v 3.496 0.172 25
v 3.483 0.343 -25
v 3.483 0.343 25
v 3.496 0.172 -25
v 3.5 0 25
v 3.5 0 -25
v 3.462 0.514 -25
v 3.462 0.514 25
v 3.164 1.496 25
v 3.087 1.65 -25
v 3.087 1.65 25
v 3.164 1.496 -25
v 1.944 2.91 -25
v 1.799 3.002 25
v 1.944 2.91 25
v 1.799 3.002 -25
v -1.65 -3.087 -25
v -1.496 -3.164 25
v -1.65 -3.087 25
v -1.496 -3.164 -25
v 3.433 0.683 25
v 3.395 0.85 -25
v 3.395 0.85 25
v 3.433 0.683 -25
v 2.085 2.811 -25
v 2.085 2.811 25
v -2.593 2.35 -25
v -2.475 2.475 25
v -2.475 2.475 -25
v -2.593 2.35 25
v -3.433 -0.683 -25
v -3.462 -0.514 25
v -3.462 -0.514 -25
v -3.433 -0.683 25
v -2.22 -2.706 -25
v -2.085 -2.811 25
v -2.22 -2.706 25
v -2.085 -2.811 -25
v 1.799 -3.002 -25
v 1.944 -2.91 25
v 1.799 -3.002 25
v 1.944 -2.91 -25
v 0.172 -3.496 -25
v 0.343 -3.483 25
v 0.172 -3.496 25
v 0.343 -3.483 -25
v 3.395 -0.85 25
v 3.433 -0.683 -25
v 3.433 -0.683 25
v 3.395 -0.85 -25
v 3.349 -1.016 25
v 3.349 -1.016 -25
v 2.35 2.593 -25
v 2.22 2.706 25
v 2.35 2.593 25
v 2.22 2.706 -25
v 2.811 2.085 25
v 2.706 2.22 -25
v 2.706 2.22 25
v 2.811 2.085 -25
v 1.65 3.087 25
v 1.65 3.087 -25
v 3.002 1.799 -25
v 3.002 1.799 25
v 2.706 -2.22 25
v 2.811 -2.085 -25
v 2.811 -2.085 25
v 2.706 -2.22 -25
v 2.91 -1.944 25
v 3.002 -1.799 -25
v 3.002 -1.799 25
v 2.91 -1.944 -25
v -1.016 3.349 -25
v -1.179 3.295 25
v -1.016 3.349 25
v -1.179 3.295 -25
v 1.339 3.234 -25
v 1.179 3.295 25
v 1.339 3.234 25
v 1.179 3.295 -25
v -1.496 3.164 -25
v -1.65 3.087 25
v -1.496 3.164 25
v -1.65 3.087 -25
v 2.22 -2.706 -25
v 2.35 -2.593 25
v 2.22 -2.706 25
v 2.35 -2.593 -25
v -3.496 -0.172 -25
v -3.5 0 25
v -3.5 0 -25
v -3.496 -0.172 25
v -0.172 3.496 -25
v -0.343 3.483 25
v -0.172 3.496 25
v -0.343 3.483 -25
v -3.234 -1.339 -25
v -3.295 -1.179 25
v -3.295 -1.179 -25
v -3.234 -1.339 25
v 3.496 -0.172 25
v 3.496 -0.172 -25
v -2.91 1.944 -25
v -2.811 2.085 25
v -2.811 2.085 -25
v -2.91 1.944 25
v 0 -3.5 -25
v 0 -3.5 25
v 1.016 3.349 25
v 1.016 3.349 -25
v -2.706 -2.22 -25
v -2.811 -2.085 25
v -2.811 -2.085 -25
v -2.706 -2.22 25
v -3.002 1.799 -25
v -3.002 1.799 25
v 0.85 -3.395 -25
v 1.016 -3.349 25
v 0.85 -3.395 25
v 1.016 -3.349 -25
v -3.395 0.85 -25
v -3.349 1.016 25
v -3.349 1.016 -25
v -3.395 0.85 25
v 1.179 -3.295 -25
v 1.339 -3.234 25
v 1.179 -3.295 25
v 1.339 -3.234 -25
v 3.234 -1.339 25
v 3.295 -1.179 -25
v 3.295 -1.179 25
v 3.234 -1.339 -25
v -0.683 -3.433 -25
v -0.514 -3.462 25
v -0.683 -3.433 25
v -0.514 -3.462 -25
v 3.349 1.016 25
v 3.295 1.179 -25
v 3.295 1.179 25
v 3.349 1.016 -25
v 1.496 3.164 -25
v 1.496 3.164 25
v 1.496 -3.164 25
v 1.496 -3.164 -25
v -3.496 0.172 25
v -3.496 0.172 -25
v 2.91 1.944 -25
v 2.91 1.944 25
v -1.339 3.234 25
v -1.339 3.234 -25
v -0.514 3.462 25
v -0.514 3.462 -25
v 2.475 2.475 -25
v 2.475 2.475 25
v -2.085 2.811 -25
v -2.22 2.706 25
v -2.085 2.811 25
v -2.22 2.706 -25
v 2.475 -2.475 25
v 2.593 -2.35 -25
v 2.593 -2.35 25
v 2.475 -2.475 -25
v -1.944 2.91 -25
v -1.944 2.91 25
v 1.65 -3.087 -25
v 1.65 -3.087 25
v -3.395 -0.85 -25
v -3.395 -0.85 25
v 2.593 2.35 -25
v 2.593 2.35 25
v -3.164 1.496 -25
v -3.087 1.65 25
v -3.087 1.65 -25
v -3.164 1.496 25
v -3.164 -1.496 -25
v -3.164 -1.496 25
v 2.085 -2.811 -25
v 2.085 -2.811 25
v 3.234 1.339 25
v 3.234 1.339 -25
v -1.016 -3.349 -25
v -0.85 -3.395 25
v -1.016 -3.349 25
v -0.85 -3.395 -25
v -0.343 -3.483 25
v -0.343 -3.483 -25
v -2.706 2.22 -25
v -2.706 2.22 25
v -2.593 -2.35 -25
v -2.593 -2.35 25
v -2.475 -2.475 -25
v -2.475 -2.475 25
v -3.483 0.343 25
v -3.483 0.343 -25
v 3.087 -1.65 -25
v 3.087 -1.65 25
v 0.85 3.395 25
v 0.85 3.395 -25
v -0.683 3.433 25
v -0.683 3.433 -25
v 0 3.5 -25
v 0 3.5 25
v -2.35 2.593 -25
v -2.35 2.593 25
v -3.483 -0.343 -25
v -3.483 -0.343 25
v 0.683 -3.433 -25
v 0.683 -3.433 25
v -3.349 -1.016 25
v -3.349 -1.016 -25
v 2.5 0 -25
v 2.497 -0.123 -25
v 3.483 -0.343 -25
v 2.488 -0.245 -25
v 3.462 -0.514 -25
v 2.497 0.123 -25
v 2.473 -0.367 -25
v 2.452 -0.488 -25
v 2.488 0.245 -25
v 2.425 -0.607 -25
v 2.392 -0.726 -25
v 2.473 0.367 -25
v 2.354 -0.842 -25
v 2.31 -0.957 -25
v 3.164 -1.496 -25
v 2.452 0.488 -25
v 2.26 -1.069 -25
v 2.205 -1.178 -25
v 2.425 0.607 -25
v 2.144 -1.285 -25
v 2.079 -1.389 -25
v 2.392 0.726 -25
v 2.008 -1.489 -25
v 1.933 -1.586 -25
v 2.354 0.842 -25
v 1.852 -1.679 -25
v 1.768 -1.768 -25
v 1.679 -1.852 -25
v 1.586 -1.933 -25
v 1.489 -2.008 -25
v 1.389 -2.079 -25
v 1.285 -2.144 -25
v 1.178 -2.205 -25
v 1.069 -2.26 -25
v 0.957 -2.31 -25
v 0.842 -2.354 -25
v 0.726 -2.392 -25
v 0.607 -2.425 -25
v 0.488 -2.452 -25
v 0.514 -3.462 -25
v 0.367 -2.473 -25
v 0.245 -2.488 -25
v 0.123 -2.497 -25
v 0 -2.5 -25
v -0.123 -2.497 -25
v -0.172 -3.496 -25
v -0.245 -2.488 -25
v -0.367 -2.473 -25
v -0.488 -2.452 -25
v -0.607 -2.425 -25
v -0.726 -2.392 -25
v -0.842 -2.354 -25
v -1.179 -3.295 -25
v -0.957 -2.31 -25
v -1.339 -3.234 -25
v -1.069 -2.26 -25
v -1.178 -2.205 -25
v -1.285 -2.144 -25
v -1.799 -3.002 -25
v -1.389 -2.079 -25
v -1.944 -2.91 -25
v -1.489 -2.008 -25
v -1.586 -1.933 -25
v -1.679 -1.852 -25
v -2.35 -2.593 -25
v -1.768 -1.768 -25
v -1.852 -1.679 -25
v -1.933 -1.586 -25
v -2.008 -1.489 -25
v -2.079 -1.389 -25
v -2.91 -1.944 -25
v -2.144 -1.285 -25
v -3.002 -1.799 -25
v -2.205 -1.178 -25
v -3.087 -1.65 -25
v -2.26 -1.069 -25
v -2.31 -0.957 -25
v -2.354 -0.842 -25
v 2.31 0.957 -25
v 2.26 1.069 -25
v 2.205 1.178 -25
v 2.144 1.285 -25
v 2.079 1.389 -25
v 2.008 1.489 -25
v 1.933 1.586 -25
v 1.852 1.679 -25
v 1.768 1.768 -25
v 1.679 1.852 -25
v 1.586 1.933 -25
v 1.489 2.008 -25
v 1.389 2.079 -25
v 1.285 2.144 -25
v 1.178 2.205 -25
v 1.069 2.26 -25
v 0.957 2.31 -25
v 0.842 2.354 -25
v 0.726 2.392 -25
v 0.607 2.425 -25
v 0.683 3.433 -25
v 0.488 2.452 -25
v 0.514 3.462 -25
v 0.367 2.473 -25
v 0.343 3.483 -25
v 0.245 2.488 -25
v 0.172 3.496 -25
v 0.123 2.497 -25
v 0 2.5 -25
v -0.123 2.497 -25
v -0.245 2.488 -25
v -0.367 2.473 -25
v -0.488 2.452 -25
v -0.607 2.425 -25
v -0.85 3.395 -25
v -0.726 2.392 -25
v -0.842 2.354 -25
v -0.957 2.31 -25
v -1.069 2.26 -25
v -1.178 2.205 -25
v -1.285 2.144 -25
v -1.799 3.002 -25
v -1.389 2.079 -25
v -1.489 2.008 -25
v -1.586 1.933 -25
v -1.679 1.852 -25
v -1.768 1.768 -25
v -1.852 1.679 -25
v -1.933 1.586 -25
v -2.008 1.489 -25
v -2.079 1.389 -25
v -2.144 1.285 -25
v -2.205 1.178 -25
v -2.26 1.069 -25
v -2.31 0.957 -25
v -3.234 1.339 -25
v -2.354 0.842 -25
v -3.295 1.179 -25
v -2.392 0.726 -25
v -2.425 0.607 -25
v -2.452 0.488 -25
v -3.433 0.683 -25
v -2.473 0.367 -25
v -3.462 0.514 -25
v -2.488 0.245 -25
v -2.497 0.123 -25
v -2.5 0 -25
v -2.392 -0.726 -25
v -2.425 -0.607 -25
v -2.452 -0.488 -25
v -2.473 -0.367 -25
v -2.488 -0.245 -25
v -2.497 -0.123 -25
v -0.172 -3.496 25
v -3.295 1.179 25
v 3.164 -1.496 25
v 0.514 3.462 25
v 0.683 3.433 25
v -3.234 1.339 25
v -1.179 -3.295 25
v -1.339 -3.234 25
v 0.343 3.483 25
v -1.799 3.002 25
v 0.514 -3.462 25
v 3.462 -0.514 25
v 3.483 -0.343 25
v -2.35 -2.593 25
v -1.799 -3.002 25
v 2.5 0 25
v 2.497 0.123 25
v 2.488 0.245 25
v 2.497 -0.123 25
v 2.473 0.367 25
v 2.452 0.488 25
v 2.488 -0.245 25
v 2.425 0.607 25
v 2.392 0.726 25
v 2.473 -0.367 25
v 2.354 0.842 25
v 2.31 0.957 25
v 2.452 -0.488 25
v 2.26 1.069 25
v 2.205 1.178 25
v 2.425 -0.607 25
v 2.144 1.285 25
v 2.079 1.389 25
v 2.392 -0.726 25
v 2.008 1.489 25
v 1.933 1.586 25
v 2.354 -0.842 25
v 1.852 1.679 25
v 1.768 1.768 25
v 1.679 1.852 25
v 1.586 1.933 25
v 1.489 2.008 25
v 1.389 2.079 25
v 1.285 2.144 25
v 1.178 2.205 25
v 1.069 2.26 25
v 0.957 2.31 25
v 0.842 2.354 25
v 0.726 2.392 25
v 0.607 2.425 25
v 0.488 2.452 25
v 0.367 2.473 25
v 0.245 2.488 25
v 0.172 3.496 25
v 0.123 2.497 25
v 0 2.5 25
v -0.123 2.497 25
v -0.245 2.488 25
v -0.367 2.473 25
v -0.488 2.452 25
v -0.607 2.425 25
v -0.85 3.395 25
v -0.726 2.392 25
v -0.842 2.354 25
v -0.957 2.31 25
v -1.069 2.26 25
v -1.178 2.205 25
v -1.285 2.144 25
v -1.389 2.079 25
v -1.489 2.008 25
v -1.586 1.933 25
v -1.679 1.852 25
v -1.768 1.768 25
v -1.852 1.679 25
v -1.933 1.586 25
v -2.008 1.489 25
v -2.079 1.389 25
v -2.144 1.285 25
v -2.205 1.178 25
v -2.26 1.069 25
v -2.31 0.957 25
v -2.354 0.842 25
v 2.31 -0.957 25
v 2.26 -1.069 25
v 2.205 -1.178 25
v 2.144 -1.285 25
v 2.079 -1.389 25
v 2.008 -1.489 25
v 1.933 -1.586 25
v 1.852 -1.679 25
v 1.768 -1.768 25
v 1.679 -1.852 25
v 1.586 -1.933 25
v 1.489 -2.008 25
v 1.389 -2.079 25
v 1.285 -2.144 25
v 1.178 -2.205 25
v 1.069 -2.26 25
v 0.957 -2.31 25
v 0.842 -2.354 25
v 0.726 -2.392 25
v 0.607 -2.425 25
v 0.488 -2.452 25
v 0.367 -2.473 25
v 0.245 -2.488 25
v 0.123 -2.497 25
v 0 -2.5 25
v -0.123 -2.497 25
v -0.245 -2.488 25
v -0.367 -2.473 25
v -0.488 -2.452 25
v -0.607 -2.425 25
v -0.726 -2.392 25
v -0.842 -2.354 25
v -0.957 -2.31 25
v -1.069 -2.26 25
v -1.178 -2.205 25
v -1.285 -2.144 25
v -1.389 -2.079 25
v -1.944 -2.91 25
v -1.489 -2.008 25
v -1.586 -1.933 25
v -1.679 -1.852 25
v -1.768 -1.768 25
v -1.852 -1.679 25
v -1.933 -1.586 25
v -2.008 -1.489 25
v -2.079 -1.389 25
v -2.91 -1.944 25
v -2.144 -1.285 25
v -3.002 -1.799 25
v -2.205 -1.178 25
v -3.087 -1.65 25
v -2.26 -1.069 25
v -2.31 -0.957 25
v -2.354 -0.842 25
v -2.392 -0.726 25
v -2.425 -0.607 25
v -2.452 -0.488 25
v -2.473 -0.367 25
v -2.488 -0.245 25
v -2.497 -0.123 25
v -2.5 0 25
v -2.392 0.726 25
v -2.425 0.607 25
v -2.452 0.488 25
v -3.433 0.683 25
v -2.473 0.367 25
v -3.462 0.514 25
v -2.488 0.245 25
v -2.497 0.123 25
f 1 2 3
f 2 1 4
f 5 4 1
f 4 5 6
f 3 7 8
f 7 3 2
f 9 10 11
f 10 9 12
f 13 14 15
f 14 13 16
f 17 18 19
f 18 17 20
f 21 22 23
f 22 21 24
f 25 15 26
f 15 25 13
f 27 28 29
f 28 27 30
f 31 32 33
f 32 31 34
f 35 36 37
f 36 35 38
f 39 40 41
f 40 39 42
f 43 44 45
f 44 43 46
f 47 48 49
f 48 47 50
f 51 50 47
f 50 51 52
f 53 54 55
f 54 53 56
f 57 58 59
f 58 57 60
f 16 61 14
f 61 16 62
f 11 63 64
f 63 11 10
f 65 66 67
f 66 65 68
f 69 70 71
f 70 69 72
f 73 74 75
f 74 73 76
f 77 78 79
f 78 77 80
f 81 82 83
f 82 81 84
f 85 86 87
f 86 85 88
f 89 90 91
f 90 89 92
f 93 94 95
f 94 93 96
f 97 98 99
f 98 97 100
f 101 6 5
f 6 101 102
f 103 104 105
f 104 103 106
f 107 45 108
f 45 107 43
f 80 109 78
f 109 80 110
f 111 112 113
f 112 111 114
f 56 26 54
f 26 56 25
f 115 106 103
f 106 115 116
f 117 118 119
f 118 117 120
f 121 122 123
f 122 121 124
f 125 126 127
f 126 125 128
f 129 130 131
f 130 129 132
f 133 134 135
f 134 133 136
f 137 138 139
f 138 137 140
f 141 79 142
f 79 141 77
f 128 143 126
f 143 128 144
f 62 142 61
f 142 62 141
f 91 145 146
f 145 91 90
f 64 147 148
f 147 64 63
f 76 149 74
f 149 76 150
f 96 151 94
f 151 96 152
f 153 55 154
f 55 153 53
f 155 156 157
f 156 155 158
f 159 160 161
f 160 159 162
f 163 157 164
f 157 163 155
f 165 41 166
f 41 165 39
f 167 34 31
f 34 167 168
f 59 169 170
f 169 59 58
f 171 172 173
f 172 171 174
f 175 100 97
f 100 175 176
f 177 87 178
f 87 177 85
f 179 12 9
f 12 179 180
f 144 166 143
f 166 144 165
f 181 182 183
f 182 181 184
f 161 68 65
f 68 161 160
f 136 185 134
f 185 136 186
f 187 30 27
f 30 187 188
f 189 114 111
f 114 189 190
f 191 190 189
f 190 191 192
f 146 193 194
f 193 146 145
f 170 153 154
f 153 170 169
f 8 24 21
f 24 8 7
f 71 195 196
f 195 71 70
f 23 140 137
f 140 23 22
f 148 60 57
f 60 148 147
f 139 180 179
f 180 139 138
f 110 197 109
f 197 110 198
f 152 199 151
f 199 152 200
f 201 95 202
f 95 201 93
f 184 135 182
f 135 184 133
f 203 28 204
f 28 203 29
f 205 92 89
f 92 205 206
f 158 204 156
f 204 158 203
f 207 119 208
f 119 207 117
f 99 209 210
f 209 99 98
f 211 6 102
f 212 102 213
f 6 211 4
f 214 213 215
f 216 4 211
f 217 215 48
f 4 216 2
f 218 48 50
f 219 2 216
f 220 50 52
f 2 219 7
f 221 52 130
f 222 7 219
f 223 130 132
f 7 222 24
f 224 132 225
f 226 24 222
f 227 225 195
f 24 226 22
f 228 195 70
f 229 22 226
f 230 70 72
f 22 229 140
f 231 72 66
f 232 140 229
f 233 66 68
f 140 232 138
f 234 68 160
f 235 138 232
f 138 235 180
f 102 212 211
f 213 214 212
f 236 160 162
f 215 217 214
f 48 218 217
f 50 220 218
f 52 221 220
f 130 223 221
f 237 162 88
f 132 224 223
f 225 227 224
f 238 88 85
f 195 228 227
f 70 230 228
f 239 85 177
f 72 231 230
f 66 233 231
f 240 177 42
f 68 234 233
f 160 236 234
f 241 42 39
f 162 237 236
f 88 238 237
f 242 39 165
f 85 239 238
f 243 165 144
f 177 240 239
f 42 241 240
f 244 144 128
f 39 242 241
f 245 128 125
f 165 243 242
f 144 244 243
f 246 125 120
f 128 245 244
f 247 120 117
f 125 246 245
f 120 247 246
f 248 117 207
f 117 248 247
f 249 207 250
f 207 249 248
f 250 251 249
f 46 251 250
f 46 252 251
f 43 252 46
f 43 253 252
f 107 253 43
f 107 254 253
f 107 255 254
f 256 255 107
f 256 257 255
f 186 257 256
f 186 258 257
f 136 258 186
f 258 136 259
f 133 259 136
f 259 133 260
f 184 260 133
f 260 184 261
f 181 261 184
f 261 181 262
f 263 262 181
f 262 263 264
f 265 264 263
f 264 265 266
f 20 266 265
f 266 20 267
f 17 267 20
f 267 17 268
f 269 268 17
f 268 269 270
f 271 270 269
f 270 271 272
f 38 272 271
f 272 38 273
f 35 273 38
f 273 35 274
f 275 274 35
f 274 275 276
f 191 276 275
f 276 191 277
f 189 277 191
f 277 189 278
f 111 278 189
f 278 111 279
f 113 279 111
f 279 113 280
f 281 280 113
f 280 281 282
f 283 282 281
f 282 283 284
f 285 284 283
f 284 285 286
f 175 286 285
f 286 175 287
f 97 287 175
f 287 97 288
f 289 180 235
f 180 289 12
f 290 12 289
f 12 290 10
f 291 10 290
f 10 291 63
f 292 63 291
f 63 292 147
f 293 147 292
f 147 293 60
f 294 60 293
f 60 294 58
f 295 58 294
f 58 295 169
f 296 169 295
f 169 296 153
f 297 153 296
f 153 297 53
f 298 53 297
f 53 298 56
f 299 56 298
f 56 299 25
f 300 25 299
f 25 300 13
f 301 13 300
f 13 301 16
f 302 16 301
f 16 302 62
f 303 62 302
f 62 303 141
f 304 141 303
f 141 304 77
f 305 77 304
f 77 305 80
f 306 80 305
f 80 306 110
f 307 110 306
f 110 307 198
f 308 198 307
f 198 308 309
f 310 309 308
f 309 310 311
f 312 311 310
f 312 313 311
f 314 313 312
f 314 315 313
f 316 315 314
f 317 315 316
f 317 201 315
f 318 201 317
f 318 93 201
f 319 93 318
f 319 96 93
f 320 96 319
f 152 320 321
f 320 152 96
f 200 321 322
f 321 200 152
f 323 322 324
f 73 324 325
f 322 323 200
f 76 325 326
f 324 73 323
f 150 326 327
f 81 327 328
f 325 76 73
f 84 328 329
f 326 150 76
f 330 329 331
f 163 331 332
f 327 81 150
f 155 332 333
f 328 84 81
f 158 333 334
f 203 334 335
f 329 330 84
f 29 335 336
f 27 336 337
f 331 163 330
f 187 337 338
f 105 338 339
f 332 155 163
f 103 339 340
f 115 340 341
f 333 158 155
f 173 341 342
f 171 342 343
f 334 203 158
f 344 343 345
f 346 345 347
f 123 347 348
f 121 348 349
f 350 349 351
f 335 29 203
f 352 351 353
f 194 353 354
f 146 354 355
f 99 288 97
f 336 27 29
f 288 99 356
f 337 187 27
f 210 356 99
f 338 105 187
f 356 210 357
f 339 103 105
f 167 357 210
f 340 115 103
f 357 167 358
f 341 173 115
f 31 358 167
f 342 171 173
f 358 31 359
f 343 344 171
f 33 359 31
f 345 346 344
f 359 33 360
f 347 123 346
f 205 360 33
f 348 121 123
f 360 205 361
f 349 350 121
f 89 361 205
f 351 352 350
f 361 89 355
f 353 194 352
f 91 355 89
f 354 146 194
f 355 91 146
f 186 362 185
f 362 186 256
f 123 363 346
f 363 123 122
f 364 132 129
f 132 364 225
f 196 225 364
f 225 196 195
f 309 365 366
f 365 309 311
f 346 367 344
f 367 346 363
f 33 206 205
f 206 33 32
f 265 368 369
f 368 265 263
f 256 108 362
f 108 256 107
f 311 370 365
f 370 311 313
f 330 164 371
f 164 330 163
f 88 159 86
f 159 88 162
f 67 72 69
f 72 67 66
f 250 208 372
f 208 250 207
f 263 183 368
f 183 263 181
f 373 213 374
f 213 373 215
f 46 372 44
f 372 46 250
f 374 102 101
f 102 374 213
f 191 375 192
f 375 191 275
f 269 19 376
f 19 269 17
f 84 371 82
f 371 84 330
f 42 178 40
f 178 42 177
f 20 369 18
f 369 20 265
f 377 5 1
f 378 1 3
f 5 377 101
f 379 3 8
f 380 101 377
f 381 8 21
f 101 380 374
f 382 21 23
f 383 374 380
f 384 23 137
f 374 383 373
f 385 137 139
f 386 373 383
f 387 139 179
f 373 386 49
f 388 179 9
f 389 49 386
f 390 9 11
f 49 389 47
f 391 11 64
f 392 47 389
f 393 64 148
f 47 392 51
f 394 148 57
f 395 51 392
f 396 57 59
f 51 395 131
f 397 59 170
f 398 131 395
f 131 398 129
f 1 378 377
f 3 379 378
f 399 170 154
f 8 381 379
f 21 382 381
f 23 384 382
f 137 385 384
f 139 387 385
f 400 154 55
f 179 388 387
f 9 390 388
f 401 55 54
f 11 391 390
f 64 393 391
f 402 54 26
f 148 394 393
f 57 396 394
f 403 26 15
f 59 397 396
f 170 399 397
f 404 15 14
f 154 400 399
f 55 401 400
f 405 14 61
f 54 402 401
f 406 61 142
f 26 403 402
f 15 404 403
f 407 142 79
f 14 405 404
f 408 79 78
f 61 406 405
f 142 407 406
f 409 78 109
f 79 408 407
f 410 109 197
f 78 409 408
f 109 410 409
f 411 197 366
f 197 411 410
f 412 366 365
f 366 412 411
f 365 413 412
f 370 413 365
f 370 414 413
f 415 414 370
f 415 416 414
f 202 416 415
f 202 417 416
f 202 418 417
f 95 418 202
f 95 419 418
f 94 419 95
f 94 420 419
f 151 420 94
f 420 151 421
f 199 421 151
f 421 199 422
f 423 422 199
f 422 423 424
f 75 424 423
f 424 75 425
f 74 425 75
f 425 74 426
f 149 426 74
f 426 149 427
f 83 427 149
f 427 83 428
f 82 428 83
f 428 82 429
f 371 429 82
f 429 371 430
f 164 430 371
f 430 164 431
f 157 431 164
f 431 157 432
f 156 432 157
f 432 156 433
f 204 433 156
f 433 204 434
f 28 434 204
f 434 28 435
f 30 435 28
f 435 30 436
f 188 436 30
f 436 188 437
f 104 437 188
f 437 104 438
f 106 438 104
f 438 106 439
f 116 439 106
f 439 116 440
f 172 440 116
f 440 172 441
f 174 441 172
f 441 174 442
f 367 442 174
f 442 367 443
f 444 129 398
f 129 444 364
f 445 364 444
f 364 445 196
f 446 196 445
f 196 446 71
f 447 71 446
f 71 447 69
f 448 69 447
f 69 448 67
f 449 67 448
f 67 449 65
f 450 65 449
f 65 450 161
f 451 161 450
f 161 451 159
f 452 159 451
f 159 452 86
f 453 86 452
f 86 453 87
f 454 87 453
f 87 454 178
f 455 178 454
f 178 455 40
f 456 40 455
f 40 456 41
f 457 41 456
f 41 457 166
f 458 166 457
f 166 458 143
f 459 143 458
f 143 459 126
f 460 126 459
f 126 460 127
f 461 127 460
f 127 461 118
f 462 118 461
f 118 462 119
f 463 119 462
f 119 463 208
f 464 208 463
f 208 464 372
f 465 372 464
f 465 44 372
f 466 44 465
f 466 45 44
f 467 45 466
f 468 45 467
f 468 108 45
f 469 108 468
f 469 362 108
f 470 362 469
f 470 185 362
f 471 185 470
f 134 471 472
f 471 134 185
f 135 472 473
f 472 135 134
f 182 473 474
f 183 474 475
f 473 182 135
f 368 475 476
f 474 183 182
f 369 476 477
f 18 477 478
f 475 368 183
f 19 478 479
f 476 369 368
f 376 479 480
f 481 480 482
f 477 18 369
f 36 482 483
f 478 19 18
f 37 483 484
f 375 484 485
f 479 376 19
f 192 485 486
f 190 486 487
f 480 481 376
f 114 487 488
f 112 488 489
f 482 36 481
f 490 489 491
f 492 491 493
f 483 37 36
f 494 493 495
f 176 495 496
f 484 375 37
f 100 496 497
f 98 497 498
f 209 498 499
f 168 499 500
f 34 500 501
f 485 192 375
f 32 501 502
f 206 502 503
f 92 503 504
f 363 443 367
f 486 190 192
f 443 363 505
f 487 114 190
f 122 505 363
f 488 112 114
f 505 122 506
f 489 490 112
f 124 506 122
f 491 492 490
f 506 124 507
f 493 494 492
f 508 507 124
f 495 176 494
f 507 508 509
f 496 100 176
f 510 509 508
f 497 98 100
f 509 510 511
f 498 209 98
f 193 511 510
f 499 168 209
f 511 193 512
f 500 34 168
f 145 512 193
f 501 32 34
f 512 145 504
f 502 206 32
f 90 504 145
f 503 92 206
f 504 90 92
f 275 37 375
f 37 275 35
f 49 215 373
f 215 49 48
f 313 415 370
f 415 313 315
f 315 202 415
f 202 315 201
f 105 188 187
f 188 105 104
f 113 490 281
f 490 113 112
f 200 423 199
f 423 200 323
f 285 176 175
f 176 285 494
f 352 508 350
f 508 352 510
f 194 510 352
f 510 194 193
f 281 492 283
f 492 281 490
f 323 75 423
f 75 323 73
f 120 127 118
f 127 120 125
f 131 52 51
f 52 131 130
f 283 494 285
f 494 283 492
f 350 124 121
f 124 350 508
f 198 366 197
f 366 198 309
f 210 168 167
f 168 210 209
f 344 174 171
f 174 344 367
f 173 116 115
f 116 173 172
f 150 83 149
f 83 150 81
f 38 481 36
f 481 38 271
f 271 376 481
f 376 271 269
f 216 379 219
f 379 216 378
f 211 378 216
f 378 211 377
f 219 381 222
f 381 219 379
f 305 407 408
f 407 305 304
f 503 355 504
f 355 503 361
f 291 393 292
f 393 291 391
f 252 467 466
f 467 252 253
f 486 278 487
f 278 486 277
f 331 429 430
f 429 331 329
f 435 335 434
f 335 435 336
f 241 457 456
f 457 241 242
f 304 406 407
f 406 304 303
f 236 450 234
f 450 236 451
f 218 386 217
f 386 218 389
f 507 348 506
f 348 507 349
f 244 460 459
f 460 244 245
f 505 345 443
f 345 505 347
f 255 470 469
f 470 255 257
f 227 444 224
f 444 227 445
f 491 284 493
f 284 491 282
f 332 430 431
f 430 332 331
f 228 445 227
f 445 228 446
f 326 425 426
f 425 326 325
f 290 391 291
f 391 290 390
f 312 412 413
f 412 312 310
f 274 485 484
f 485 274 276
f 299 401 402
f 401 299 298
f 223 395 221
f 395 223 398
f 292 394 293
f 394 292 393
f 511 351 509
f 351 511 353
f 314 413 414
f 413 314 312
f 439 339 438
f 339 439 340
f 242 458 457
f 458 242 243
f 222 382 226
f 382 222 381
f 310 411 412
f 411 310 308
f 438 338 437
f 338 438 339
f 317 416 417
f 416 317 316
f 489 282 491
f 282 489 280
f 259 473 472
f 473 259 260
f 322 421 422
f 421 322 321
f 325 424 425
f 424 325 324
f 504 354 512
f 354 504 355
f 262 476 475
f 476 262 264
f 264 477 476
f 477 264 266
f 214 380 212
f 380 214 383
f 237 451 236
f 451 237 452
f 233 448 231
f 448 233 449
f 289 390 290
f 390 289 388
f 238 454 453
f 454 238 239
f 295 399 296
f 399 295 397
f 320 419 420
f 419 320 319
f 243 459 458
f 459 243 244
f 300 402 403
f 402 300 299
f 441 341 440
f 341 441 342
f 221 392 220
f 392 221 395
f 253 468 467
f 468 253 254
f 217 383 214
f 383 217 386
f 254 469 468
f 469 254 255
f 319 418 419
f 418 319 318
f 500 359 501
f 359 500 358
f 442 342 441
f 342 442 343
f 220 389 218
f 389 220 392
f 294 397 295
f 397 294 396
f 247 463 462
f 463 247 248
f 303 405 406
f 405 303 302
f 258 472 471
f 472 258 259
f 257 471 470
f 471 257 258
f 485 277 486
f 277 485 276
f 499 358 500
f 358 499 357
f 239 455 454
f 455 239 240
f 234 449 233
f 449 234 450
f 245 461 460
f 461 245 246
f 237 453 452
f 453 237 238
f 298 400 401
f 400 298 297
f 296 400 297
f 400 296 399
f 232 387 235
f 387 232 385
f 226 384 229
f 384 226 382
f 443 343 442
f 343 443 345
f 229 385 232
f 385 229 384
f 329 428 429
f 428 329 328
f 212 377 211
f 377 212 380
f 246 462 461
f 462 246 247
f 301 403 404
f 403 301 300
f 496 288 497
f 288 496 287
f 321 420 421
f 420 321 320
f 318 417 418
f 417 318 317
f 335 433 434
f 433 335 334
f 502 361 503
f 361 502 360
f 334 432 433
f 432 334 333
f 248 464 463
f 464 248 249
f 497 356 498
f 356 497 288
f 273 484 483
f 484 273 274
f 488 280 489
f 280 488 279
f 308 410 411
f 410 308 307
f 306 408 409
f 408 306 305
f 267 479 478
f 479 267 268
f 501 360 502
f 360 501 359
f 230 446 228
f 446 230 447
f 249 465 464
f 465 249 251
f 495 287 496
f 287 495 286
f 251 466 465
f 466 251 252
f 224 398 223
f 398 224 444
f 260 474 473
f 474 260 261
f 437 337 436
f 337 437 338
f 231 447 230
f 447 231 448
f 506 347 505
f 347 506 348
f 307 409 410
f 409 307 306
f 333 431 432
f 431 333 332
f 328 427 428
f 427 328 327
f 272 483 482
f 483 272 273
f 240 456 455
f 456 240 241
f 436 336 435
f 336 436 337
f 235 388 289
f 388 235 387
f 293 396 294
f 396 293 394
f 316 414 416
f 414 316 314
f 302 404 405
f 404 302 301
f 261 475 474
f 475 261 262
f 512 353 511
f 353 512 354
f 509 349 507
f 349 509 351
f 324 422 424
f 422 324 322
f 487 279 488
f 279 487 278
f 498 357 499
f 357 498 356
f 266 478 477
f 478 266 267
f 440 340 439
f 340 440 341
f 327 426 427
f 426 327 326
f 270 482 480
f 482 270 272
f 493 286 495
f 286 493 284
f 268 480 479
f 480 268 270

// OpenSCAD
// PTFE heatshrink sleeving tubing (hollow tube)

// Quality (smooth circle)
$fn = 128;

// Parameters (mm)
inner_diameter = 5;
outer_diameter = 7;
length = 50;
centered = true;

// Robust hollow tube
module tubing_segment(inner_d, outer_d, len, centered=false) {
    wall = (outer_d - inner_d) / 2;
    assert(inner_d > 0, "inner_d must be > 0");
    assert(outer_d > inner_d, "outer_d must be > inner_d");
    assert(wall > 0, "wall thickness must be > 0");
    assert(len > 0, "length must be > 0");

    eps = 0.02; // small overlap to avoid coplanar faces

    difference() {
        cylinder(d=outer_d, h=len, center=centered);
        // Inner bore: always centered, and slightly longer to guarantee a clean through-hole
        cylinder(d=inner_d, h=len + 2*eps, center=true);
    }
}

tubing_segment(inner_diameter, outer_diameter, length, centered);
